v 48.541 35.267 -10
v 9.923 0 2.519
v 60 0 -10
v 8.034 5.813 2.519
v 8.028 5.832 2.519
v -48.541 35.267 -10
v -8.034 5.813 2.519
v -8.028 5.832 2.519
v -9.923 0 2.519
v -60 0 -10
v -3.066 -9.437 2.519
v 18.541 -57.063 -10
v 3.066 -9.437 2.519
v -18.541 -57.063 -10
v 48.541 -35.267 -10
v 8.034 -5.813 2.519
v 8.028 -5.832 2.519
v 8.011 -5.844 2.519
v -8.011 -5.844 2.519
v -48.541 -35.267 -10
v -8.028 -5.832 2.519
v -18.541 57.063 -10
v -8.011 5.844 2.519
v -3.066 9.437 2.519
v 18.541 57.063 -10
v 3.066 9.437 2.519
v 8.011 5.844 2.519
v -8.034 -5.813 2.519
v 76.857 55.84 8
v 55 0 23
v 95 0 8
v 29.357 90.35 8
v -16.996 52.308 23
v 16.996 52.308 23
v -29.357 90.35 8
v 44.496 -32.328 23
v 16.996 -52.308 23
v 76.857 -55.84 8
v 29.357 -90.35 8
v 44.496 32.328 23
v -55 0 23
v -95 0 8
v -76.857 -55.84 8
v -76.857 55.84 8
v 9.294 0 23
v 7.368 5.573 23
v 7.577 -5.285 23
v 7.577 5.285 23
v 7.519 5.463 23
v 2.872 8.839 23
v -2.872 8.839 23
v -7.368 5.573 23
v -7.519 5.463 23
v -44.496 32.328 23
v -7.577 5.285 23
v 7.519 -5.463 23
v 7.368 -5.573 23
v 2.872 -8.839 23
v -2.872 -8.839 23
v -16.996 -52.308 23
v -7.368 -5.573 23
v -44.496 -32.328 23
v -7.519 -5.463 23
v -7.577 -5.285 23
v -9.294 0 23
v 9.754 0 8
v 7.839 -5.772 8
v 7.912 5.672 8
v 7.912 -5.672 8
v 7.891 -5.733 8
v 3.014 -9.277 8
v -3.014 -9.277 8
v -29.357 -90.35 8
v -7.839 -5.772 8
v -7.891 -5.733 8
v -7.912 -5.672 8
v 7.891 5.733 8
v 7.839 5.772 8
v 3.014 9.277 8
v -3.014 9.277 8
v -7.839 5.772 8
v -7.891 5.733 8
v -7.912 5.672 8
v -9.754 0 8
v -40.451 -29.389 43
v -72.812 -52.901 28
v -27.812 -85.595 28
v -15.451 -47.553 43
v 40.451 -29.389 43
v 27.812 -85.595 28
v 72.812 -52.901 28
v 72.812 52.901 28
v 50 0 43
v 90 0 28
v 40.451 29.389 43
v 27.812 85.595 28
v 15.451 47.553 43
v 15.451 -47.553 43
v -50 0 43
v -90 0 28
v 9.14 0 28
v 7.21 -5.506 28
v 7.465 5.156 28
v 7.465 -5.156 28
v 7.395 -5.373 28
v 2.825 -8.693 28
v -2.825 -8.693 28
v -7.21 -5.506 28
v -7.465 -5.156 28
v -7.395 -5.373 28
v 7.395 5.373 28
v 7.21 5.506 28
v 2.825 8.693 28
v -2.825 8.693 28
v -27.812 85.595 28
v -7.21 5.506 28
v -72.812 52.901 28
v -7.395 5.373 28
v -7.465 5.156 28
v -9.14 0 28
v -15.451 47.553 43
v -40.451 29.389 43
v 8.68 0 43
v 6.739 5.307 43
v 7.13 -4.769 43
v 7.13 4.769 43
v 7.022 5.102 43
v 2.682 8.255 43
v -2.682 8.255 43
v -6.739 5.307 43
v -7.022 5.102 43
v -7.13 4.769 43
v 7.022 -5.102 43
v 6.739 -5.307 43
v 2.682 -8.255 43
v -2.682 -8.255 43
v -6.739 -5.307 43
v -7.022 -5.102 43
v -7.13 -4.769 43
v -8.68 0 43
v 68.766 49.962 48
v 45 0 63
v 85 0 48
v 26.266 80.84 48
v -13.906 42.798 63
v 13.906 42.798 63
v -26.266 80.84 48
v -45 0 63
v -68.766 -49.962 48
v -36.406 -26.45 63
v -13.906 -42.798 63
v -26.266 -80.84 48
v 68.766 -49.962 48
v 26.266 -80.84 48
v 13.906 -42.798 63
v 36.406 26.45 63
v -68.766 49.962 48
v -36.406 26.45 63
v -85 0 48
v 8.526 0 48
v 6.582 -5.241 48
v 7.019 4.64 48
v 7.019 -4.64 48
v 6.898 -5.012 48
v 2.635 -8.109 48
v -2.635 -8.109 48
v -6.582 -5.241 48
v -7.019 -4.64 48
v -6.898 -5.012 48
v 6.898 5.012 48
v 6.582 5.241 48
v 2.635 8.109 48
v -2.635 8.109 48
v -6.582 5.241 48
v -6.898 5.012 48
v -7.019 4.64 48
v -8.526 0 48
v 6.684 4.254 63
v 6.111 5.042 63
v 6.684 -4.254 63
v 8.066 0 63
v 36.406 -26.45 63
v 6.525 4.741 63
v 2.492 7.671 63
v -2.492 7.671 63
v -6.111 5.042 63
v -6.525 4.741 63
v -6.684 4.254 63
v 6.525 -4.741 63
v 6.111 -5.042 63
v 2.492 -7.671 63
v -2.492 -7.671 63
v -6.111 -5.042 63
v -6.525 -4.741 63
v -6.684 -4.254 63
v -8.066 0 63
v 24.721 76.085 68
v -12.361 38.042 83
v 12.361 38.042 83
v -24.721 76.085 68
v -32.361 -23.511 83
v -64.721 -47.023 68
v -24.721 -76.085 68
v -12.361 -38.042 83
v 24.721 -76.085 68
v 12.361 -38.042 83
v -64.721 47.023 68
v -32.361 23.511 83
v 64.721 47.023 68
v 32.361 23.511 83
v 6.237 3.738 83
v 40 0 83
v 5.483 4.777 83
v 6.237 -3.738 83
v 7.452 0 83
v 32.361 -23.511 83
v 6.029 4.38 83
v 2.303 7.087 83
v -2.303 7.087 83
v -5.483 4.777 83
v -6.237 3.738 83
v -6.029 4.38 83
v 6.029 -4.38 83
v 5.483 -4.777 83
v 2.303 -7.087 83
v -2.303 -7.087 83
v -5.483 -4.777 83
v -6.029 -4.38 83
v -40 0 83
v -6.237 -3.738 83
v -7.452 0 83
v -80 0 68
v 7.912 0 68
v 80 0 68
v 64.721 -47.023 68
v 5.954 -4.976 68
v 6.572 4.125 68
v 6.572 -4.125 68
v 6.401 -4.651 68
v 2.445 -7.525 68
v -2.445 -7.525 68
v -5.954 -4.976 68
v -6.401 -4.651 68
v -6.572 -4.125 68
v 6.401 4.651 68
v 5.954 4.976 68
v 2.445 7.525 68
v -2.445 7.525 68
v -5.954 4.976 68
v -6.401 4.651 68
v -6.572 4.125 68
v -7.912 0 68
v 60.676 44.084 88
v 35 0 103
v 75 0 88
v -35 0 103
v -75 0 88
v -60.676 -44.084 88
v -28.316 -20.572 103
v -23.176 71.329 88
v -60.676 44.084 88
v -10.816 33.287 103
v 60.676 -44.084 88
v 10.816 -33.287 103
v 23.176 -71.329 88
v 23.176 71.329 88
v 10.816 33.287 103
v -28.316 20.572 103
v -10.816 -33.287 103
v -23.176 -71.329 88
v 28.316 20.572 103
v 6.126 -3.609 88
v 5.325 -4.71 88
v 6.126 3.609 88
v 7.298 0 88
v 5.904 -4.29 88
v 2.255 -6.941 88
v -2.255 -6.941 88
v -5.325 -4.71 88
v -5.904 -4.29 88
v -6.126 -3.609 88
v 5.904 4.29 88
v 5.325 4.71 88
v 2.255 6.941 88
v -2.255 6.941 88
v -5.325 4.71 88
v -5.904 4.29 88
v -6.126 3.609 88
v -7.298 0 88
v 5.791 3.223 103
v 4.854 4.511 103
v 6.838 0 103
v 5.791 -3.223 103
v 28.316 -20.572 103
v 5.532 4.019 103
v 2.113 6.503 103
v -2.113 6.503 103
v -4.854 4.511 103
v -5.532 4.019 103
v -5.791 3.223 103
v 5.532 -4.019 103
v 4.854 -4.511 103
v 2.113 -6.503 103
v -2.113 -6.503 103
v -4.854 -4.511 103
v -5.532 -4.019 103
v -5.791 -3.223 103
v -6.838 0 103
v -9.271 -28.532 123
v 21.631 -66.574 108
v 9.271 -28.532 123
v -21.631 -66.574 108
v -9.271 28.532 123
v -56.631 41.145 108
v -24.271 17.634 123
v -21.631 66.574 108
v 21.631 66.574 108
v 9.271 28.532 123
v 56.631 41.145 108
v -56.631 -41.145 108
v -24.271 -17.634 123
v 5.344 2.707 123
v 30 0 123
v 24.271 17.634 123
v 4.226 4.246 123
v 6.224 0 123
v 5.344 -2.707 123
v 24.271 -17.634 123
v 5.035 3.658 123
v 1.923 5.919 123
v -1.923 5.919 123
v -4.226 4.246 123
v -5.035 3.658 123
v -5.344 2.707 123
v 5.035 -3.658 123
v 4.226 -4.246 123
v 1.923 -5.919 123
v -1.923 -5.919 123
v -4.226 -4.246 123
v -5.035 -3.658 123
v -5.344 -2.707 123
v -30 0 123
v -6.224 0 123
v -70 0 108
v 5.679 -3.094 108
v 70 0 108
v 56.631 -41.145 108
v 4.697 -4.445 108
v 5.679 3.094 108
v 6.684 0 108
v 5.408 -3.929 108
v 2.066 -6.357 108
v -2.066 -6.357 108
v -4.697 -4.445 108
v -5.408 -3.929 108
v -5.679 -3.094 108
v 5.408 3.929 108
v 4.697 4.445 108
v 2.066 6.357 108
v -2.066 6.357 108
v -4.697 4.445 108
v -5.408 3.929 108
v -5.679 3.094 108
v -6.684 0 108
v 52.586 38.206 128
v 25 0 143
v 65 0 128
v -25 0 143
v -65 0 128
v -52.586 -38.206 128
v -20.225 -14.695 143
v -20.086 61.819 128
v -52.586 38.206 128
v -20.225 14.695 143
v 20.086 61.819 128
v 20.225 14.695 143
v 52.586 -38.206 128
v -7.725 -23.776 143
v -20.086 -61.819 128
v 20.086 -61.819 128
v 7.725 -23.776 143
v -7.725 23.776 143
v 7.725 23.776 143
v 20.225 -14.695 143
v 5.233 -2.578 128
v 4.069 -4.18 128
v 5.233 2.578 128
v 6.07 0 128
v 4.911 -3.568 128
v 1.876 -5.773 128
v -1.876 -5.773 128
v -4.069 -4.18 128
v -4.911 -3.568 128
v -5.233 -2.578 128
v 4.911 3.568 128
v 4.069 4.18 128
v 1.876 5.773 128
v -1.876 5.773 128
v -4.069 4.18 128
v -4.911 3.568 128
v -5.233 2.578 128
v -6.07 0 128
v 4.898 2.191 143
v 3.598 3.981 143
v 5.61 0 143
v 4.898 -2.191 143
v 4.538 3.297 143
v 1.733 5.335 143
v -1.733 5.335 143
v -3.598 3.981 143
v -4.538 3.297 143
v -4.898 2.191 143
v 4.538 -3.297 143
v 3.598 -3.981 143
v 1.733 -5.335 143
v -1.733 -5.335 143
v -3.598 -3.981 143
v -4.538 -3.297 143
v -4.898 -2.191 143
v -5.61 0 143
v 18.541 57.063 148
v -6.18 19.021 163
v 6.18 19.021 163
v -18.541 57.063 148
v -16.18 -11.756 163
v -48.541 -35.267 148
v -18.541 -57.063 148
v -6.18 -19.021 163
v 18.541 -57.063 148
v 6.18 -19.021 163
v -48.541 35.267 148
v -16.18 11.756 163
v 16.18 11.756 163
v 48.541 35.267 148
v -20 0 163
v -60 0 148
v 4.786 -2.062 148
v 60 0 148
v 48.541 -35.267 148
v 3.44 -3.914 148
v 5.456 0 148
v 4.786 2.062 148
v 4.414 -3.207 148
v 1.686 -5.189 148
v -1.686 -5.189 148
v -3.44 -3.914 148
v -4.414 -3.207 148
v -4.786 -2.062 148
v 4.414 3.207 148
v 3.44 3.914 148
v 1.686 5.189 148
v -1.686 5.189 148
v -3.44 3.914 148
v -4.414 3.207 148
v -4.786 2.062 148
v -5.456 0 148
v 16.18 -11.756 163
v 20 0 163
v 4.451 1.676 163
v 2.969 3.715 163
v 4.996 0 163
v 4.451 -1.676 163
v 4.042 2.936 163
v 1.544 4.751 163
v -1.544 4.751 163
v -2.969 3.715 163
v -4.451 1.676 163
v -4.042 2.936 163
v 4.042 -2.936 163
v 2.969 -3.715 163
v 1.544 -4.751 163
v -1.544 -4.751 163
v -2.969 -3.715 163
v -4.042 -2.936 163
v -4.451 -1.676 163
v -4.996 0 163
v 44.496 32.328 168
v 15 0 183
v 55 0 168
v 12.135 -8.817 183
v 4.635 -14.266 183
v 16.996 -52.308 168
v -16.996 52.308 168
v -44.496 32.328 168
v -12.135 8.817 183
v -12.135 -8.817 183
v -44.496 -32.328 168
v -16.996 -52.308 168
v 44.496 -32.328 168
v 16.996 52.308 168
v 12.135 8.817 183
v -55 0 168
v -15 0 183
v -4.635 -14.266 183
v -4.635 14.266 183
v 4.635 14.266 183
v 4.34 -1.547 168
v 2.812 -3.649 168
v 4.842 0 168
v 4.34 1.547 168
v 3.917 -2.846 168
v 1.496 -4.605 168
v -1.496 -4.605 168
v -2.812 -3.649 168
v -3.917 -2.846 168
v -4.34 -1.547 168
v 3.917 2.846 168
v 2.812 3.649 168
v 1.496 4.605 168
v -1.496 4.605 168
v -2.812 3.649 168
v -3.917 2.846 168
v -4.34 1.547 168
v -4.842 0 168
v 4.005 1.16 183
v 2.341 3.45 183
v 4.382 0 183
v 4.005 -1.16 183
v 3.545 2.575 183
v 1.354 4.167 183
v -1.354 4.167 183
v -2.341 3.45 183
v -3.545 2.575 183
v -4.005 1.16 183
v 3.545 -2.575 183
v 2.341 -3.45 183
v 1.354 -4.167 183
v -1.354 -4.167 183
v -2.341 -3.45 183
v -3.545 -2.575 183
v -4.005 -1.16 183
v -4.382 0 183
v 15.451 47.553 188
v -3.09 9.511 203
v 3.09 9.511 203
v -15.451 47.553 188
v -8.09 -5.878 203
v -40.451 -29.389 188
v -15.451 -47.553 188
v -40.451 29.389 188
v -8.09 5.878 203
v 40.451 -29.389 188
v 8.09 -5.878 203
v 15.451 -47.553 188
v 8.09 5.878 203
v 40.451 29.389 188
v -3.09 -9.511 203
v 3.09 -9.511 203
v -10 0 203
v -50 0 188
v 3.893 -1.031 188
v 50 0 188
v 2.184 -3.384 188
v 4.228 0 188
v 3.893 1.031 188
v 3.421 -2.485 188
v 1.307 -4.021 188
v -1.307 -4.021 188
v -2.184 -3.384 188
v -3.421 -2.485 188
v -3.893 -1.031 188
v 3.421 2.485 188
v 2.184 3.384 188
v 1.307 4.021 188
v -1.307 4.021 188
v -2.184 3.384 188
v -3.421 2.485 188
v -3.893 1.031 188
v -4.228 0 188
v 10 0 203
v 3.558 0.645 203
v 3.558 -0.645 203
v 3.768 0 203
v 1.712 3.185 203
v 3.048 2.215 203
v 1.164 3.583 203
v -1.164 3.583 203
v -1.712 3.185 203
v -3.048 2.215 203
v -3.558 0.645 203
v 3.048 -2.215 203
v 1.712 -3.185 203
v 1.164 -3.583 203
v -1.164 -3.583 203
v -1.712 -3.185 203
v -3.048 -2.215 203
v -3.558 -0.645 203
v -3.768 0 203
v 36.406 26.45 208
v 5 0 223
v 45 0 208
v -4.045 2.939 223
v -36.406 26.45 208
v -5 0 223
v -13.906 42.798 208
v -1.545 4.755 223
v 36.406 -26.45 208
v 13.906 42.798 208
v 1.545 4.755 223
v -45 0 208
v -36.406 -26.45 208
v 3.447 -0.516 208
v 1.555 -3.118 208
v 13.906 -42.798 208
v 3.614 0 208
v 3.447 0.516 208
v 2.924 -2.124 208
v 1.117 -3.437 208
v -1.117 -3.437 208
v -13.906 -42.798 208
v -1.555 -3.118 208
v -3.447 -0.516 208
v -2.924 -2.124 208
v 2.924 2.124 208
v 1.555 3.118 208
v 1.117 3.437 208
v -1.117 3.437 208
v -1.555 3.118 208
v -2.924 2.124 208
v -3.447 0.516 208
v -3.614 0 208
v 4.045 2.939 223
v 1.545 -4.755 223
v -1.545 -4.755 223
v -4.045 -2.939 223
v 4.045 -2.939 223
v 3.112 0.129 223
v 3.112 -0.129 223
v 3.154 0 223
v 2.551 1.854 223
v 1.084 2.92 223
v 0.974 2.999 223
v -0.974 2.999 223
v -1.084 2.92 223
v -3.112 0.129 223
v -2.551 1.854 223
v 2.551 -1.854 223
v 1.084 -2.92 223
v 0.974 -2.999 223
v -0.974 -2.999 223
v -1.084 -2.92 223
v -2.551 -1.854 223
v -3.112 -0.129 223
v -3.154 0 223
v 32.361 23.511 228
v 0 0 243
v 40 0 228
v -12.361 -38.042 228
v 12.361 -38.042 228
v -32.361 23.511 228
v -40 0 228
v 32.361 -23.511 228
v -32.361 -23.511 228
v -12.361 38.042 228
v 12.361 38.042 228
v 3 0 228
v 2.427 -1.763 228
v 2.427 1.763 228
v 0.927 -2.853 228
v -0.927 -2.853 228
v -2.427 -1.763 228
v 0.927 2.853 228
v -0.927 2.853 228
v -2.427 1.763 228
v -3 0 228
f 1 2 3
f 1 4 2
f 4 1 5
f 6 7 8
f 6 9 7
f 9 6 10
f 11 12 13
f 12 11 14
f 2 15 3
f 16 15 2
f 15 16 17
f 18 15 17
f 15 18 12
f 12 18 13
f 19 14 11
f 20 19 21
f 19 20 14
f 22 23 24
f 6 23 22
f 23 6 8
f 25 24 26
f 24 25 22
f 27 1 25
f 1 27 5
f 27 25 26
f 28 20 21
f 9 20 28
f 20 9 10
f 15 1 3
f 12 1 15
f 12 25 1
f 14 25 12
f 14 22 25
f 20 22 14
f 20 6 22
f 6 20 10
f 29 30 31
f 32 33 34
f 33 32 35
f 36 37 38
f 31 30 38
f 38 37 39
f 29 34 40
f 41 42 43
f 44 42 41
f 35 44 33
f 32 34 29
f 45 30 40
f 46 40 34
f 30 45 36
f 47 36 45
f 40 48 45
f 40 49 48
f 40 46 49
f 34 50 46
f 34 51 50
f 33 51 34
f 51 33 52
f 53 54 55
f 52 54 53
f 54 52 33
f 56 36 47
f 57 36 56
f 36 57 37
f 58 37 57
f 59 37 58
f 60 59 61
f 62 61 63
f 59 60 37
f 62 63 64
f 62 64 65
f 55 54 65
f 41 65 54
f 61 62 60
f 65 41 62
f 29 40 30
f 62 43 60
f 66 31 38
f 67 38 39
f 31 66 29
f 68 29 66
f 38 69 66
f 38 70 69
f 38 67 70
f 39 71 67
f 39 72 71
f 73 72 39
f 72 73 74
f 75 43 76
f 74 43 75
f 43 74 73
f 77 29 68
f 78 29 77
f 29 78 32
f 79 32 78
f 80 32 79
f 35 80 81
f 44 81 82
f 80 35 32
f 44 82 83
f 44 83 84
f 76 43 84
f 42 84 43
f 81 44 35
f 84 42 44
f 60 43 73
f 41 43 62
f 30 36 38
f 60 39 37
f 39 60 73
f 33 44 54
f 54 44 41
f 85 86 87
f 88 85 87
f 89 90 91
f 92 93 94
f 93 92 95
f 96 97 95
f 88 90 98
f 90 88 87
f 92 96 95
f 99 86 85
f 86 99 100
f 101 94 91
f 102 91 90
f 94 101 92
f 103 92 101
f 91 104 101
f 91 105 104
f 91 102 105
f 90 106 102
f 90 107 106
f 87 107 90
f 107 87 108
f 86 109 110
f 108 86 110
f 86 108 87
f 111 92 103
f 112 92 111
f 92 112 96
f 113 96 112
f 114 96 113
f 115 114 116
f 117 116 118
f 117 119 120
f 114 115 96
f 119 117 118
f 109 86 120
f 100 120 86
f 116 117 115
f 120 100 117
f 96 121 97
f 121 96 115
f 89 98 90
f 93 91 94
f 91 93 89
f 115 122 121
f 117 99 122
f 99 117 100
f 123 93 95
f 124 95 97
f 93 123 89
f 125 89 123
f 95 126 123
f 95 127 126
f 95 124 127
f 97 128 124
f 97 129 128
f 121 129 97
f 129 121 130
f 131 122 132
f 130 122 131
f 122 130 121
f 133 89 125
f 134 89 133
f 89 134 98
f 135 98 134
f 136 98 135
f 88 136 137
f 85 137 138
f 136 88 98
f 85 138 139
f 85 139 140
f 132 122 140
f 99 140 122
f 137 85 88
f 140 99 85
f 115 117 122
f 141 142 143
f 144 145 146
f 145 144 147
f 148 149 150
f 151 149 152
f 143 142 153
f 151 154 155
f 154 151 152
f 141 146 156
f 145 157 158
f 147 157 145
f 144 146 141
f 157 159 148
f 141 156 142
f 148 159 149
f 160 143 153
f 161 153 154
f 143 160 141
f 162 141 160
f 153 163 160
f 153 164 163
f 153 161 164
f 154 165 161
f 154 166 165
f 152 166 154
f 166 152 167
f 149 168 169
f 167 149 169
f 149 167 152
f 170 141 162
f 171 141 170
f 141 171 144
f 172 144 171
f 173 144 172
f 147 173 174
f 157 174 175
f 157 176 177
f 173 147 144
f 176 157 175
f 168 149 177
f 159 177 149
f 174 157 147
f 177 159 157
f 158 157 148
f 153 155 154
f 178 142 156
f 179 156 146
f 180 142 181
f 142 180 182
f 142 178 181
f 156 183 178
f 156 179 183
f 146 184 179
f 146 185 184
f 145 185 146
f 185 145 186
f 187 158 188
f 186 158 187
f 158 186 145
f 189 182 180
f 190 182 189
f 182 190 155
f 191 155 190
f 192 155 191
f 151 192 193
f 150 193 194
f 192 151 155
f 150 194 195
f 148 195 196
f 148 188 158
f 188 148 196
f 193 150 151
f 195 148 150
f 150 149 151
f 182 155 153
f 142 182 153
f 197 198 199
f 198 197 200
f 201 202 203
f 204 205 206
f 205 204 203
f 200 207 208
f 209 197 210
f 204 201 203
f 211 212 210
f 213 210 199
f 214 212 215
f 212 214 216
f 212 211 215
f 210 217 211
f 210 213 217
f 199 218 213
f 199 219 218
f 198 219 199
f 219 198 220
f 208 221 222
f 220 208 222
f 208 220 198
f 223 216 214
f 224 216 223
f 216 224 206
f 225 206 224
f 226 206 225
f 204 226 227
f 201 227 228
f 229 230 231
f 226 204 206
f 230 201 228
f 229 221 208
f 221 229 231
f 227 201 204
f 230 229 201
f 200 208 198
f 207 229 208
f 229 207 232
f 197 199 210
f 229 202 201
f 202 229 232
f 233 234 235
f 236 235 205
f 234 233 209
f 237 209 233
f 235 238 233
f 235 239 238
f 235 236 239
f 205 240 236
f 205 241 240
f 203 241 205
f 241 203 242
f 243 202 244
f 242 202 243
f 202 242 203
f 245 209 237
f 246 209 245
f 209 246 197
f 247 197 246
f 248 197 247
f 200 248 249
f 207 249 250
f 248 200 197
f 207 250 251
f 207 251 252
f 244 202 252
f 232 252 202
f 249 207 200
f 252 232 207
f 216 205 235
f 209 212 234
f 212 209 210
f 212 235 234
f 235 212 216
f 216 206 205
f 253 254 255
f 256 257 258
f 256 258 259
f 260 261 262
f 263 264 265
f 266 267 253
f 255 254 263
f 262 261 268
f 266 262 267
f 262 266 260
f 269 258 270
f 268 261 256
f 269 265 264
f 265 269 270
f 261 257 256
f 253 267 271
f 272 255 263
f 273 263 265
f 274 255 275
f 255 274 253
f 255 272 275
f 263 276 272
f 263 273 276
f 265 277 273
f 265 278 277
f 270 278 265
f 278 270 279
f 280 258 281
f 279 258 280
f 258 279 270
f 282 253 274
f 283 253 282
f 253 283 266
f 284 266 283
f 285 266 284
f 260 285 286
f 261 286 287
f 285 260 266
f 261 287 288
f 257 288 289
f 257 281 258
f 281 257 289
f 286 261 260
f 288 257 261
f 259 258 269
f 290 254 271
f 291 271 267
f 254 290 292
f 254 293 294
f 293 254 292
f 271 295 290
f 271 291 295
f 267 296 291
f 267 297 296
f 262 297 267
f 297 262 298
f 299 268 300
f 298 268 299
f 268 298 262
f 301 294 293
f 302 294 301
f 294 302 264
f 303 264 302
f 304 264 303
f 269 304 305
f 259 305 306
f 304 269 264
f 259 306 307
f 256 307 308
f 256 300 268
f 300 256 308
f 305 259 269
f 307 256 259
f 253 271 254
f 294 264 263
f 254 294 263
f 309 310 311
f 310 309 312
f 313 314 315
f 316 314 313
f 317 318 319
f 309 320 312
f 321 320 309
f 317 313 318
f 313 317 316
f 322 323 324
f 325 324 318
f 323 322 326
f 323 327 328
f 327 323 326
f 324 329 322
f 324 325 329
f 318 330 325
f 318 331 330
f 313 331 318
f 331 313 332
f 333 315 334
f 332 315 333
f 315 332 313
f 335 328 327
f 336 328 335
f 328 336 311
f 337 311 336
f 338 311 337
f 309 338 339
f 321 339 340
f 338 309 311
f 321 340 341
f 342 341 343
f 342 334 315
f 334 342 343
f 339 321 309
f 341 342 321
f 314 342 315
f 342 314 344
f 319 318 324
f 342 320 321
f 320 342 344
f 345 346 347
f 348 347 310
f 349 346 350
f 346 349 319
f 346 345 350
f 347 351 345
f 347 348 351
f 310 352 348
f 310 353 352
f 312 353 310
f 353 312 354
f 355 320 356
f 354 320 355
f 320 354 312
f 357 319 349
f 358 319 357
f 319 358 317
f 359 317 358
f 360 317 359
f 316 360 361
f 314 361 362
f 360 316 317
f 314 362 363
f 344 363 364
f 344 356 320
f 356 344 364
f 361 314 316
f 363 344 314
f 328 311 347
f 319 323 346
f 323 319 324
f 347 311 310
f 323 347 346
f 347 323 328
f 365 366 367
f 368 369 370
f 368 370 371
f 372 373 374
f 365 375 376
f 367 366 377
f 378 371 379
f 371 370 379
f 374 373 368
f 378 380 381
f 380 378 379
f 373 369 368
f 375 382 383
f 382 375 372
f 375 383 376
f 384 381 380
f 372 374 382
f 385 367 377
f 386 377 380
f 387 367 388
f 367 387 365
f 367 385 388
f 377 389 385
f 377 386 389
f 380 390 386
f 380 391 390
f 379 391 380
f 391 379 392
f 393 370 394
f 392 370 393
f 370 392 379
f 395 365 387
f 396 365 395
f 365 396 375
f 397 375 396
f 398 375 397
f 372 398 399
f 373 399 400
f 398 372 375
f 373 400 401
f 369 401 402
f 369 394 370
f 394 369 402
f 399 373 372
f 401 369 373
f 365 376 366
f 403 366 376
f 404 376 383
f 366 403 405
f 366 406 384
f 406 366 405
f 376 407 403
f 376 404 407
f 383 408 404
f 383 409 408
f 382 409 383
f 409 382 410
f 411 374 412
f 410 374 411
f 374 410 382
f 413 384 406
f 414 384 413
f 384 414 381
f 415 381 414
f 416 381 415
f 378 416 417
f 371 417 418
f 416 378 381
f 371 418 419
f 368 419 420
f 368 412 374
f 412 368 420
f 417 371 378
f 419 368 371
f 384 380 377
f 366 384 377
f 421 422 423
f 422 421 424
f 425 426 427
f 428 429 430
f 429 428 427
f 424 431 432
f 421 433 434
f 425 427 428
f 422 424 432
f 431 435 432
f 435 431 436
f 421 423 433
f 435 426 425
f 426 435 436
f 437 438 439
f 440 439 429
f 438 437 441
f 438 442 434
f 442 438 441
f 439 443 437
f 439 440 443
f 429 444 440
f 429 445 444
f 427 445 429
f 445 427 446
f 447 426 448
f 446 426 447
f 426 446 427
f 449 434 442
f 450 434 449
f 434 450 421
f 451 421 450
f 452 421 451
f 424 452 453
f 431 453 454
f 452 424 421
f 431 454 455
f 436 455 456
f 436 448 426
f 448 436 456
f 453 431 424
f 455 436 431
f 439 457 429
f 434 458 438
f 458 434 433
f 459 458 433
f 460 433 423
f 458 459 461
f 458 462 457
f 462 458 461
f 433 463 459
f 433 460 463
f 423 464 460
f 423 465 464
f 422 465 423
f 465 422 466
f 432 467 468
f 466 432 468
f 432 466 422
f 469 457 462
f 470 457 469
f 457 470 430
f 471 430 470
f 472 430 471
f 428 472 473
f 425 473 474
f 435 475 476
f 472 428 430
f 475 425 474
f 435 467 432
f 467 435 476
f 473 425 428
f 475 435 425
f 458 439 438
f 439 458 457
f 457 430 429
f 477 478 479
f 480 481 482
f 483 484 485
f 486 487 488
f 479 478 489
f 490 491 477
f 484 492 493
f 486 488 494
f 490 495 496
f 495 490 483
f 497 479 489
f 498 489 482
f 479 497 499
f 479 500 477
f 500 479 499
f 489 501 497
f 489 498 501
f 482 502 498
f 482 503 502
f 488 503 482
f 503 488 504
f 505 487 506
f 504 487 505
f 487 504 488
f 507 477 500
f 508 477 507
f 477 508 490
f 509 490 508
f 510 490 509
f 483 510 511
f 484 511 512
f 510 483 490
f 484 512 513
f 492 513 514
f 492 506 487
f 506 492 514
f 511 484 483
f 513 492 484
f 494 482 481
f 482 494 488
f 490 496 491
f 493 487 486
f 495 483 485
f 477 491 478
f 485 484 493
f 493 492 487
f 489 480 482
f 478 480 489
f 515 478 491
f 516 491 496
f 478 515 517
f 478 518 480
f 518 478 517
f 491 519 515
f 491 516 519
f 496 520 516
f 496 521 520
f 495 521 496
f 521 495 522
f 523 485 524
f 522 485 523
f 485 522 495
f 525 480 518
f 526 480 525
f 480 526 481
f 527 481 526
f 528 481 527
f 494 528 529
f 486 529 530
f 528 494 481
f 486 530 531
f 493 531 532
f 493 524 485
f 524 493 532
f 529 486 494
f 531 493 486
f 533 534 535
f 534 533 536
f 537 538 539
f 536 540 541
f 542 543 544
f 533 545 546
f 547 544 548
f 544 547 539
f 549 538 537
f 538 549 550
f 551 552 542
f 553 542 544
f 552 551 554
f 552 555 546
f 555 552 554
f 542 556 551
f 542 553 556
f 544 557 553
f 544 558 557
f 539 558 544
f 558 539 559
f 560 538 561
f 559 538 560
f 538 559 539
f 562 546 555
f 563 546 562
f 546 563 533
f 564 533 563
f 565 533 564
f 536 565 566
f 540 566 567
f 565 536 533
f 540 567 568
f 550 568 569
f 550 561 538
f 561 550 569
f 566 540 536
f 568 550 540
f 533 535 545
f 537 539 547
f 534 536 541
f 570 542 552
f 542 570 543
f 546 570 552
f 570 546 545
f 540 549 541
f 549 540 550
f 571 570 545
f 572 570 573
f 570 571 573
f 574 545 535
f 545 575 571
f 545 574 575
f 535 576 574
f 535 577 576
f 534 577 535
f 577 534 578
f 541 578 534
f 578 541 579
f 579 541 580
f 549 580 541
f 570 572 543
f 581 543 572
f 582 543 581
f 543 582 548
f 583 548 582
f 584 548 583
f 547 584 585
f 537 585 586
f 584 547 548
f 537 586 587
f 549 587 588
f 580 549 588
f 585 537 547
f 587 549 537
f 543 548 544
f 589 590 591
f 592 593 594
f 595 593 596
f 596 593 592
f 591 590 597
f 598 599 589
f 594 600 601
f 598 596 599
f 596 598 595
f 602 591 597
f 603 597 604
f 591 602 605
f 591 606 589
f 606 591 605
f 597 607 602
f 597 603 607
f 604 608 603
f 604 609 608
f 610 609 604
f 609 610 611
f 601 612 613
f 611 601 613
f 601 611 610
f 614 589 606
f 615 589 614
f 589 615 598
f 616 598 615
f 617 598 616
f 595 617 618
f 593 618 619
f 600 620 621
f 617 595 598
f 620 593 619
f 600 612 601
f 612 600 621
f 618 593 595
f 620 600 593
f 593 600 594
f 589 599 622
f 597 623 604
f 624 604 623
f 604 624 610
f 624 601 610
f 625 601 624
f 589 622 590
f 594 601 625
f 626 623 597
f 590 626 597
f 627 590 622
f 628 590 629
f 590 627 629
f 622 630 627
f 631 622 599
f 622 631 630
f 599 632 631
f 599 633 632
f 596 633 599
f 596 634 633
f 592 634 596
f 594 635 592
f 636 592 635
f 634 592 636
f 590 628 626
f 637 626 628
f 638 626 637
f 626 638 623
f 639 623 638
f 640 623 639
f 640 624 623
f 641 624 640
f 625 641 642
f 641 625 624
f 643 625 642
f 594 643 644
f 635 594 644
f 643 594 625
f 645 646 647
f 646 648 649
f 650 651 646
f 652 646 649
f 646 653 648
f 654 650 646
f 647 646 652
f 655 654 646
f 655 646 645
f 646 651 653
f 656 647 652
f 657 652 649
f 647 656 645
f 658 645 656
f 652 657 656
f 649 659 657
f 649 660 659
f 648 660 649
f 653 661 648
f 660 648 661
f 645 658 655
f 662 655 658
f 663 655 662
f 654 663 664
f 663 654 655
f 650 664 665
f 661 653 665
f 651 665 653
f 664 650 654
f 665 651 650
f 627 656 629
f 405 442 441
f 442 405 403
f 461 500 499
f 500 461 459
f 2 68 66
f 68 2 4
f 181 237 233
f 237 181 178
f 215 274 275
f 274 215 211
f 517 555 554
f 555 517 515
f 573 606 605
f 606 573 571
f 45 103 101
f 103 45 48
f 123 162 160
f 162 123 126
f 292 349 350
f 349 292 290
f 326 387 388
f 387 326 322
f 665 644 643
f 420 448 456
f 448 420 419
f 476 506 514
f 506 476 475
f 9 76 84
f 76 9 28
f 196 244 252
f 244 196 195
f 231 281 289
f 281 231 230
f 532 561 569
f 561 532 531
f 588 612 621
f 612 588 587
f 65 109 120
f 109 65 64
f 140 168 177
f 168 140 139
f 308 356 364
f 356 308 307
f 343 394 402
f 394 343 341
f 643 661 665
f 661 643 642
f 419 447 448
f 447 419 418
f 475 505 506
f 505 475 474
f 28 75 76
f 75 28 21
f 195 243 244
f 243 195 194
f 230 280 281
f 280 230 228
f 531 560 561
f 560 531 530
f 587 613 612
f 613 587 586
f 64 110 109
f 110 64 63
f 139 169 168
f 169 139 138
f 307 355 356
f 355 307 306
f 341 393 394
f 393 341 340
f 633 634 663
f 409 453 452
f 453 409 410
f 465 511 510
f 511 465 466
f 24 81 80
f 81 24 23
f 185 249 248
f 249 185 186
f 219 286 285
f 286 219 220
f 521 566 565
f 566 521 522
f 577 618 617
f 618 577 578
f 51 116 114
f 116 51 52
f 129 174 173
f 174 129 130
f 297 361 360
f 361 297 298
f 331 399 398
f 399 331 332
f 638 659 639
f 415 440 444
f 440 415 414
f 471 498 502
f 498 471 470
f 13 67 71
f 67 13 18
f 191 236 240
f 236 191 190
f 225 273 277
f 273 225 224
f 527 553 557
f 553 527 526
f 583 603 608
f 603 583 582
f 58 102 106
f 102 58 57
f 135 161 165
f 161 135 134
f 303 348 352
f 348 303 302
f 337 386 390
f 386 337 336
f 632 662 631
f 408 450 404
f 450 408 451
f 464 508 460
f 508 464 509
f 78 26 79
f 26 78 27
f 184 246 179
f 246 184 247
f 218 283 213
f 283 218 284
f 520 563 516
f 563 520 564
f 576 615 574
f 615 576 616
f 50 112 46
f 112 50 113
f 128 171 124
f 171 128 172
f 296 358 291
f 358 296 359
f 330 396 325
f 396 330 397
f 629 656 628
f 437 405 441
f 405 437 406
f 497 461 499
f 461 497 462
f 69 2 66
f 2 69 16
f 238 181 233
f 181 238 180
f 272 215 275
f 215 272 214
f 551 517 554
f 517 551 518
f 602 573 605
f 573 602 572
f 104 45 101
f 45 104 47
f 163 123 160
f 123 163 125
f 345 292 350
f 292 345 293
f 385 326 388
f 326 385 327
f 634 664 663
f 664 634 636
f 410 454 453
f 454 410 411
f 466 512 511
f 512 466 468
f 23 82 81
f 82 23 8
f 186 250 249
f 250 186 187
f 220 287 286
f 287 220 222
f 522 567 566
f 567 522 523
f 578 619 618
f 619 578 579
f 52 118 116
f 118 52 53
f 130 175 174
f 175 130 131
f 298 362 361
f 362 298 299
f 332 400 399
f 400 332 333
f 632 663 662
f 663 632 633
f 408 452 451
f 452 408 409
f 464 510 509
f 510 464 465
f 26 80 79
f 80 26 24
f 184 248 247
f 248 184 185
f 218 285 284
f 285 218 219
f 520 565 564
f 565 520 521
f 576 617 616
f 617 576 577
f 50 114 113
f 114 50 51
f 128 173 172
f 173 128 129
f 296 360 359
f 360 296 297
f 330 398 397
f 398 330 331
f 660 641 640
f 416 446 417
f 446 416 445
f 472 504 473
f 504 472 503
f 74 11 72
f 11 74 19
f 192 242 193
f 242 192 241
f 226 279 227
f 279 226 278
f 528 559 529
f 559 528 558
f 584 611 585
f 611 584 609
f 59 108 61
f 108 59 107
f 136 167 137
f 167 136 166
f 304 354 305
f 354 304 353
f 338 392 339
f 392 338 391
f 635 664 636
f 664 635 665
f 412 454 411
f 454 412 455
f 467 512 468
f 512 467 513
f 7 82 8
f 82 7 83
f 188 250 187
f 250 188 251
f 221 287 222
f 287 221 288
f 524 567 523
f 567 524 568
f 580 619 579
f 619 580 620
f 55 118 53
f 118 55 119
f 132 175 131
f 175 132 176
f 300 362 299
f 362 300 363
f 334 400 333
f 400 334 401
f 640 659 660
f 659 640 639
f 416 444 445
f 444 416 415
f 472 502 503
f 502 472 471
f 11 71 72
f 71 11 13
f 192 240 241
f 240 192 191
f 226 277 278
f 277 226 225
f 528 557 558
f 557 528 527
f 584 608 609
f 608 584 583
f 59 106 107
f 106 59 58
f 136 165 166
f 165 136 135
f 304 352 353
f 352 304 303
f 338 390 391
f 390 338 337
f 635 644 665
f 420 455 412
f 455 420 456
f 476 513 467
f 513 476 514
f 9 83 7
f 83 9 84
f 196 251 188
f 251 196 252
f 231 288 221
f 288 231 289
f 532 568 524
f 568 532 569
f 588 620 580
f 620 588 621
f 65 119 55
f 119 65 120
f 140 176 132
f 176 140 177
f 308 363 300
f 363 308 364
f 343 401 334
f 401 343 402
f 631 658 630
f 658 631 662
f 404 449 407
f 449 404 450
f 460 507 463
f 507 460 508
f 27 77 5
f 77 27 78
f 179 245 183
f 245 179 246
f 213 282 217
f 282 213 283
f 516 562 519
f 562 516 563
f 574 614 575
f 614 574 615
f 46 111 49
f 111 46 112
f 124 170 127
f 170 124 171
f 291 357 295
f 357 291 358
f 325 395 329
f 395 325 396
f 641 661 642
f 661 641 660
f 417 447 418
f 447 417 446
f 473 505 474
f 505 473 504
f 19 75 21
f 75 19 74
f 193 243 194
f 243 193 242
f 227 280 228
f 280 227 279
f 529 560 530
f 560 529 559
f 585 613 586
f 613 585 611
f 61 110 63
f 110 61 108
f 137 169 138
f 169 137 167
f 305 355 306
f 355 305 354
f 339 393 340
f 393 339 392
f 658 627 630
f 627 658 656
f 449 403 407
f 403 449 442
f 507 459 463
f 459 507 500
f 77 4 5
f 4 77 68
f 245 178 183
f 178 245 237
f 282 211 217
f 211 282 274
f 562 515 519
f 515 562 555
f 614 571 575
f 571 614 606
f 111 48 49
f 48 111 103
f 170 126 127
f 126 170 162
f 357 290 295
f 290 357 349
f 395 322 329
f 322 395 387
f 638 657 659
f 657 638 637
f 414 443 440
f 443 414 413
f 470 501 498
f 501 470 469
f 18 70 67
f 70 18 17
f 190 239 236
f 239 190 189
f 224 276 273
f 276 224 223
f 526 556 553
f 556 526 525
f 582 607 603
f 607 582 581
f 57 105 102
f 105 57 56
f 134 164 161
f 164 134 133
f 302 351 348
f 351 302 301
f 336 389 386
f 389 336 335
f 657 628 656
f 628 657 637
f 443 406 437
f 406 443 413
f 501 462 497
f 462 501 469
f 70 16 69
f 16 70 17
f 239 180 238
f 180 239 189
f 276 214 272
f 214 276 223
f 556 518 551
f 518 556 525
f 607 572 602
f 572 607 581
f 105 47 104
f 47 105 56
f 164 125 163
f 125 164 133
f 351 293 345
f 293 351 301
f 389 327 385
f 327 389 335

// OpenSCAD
$fn = 10;
	translate([0,0,-10]) cylinder(15,60,0);
	translate([0,0,8]) cylinder(15,95,55);
	translate([0,0,28]) cylinder(15,90,50);
	translate([0,0,48]) cylinder(15,85,45);
	translate([0,0,68]) cylinder(15,80,40);
	translate([0,0,88]) cylinder(15,75,35);
	translate([0,0,108]) cylinder(15,70,30);
	translate([0,0,128]) cylinder(15,65,25);
	translate([0,0,148]) cylinder(15,60,20);
	translate([0,0,168]) cylinder(15,55,15);
	translate([0,0,188]) cylinder(15,50,10);
	translate([0,0,208]) cylinder(15,45,5);
	translate([0,0,228]) cylinder(15,40,0);
	cylinder(228,10,3);
